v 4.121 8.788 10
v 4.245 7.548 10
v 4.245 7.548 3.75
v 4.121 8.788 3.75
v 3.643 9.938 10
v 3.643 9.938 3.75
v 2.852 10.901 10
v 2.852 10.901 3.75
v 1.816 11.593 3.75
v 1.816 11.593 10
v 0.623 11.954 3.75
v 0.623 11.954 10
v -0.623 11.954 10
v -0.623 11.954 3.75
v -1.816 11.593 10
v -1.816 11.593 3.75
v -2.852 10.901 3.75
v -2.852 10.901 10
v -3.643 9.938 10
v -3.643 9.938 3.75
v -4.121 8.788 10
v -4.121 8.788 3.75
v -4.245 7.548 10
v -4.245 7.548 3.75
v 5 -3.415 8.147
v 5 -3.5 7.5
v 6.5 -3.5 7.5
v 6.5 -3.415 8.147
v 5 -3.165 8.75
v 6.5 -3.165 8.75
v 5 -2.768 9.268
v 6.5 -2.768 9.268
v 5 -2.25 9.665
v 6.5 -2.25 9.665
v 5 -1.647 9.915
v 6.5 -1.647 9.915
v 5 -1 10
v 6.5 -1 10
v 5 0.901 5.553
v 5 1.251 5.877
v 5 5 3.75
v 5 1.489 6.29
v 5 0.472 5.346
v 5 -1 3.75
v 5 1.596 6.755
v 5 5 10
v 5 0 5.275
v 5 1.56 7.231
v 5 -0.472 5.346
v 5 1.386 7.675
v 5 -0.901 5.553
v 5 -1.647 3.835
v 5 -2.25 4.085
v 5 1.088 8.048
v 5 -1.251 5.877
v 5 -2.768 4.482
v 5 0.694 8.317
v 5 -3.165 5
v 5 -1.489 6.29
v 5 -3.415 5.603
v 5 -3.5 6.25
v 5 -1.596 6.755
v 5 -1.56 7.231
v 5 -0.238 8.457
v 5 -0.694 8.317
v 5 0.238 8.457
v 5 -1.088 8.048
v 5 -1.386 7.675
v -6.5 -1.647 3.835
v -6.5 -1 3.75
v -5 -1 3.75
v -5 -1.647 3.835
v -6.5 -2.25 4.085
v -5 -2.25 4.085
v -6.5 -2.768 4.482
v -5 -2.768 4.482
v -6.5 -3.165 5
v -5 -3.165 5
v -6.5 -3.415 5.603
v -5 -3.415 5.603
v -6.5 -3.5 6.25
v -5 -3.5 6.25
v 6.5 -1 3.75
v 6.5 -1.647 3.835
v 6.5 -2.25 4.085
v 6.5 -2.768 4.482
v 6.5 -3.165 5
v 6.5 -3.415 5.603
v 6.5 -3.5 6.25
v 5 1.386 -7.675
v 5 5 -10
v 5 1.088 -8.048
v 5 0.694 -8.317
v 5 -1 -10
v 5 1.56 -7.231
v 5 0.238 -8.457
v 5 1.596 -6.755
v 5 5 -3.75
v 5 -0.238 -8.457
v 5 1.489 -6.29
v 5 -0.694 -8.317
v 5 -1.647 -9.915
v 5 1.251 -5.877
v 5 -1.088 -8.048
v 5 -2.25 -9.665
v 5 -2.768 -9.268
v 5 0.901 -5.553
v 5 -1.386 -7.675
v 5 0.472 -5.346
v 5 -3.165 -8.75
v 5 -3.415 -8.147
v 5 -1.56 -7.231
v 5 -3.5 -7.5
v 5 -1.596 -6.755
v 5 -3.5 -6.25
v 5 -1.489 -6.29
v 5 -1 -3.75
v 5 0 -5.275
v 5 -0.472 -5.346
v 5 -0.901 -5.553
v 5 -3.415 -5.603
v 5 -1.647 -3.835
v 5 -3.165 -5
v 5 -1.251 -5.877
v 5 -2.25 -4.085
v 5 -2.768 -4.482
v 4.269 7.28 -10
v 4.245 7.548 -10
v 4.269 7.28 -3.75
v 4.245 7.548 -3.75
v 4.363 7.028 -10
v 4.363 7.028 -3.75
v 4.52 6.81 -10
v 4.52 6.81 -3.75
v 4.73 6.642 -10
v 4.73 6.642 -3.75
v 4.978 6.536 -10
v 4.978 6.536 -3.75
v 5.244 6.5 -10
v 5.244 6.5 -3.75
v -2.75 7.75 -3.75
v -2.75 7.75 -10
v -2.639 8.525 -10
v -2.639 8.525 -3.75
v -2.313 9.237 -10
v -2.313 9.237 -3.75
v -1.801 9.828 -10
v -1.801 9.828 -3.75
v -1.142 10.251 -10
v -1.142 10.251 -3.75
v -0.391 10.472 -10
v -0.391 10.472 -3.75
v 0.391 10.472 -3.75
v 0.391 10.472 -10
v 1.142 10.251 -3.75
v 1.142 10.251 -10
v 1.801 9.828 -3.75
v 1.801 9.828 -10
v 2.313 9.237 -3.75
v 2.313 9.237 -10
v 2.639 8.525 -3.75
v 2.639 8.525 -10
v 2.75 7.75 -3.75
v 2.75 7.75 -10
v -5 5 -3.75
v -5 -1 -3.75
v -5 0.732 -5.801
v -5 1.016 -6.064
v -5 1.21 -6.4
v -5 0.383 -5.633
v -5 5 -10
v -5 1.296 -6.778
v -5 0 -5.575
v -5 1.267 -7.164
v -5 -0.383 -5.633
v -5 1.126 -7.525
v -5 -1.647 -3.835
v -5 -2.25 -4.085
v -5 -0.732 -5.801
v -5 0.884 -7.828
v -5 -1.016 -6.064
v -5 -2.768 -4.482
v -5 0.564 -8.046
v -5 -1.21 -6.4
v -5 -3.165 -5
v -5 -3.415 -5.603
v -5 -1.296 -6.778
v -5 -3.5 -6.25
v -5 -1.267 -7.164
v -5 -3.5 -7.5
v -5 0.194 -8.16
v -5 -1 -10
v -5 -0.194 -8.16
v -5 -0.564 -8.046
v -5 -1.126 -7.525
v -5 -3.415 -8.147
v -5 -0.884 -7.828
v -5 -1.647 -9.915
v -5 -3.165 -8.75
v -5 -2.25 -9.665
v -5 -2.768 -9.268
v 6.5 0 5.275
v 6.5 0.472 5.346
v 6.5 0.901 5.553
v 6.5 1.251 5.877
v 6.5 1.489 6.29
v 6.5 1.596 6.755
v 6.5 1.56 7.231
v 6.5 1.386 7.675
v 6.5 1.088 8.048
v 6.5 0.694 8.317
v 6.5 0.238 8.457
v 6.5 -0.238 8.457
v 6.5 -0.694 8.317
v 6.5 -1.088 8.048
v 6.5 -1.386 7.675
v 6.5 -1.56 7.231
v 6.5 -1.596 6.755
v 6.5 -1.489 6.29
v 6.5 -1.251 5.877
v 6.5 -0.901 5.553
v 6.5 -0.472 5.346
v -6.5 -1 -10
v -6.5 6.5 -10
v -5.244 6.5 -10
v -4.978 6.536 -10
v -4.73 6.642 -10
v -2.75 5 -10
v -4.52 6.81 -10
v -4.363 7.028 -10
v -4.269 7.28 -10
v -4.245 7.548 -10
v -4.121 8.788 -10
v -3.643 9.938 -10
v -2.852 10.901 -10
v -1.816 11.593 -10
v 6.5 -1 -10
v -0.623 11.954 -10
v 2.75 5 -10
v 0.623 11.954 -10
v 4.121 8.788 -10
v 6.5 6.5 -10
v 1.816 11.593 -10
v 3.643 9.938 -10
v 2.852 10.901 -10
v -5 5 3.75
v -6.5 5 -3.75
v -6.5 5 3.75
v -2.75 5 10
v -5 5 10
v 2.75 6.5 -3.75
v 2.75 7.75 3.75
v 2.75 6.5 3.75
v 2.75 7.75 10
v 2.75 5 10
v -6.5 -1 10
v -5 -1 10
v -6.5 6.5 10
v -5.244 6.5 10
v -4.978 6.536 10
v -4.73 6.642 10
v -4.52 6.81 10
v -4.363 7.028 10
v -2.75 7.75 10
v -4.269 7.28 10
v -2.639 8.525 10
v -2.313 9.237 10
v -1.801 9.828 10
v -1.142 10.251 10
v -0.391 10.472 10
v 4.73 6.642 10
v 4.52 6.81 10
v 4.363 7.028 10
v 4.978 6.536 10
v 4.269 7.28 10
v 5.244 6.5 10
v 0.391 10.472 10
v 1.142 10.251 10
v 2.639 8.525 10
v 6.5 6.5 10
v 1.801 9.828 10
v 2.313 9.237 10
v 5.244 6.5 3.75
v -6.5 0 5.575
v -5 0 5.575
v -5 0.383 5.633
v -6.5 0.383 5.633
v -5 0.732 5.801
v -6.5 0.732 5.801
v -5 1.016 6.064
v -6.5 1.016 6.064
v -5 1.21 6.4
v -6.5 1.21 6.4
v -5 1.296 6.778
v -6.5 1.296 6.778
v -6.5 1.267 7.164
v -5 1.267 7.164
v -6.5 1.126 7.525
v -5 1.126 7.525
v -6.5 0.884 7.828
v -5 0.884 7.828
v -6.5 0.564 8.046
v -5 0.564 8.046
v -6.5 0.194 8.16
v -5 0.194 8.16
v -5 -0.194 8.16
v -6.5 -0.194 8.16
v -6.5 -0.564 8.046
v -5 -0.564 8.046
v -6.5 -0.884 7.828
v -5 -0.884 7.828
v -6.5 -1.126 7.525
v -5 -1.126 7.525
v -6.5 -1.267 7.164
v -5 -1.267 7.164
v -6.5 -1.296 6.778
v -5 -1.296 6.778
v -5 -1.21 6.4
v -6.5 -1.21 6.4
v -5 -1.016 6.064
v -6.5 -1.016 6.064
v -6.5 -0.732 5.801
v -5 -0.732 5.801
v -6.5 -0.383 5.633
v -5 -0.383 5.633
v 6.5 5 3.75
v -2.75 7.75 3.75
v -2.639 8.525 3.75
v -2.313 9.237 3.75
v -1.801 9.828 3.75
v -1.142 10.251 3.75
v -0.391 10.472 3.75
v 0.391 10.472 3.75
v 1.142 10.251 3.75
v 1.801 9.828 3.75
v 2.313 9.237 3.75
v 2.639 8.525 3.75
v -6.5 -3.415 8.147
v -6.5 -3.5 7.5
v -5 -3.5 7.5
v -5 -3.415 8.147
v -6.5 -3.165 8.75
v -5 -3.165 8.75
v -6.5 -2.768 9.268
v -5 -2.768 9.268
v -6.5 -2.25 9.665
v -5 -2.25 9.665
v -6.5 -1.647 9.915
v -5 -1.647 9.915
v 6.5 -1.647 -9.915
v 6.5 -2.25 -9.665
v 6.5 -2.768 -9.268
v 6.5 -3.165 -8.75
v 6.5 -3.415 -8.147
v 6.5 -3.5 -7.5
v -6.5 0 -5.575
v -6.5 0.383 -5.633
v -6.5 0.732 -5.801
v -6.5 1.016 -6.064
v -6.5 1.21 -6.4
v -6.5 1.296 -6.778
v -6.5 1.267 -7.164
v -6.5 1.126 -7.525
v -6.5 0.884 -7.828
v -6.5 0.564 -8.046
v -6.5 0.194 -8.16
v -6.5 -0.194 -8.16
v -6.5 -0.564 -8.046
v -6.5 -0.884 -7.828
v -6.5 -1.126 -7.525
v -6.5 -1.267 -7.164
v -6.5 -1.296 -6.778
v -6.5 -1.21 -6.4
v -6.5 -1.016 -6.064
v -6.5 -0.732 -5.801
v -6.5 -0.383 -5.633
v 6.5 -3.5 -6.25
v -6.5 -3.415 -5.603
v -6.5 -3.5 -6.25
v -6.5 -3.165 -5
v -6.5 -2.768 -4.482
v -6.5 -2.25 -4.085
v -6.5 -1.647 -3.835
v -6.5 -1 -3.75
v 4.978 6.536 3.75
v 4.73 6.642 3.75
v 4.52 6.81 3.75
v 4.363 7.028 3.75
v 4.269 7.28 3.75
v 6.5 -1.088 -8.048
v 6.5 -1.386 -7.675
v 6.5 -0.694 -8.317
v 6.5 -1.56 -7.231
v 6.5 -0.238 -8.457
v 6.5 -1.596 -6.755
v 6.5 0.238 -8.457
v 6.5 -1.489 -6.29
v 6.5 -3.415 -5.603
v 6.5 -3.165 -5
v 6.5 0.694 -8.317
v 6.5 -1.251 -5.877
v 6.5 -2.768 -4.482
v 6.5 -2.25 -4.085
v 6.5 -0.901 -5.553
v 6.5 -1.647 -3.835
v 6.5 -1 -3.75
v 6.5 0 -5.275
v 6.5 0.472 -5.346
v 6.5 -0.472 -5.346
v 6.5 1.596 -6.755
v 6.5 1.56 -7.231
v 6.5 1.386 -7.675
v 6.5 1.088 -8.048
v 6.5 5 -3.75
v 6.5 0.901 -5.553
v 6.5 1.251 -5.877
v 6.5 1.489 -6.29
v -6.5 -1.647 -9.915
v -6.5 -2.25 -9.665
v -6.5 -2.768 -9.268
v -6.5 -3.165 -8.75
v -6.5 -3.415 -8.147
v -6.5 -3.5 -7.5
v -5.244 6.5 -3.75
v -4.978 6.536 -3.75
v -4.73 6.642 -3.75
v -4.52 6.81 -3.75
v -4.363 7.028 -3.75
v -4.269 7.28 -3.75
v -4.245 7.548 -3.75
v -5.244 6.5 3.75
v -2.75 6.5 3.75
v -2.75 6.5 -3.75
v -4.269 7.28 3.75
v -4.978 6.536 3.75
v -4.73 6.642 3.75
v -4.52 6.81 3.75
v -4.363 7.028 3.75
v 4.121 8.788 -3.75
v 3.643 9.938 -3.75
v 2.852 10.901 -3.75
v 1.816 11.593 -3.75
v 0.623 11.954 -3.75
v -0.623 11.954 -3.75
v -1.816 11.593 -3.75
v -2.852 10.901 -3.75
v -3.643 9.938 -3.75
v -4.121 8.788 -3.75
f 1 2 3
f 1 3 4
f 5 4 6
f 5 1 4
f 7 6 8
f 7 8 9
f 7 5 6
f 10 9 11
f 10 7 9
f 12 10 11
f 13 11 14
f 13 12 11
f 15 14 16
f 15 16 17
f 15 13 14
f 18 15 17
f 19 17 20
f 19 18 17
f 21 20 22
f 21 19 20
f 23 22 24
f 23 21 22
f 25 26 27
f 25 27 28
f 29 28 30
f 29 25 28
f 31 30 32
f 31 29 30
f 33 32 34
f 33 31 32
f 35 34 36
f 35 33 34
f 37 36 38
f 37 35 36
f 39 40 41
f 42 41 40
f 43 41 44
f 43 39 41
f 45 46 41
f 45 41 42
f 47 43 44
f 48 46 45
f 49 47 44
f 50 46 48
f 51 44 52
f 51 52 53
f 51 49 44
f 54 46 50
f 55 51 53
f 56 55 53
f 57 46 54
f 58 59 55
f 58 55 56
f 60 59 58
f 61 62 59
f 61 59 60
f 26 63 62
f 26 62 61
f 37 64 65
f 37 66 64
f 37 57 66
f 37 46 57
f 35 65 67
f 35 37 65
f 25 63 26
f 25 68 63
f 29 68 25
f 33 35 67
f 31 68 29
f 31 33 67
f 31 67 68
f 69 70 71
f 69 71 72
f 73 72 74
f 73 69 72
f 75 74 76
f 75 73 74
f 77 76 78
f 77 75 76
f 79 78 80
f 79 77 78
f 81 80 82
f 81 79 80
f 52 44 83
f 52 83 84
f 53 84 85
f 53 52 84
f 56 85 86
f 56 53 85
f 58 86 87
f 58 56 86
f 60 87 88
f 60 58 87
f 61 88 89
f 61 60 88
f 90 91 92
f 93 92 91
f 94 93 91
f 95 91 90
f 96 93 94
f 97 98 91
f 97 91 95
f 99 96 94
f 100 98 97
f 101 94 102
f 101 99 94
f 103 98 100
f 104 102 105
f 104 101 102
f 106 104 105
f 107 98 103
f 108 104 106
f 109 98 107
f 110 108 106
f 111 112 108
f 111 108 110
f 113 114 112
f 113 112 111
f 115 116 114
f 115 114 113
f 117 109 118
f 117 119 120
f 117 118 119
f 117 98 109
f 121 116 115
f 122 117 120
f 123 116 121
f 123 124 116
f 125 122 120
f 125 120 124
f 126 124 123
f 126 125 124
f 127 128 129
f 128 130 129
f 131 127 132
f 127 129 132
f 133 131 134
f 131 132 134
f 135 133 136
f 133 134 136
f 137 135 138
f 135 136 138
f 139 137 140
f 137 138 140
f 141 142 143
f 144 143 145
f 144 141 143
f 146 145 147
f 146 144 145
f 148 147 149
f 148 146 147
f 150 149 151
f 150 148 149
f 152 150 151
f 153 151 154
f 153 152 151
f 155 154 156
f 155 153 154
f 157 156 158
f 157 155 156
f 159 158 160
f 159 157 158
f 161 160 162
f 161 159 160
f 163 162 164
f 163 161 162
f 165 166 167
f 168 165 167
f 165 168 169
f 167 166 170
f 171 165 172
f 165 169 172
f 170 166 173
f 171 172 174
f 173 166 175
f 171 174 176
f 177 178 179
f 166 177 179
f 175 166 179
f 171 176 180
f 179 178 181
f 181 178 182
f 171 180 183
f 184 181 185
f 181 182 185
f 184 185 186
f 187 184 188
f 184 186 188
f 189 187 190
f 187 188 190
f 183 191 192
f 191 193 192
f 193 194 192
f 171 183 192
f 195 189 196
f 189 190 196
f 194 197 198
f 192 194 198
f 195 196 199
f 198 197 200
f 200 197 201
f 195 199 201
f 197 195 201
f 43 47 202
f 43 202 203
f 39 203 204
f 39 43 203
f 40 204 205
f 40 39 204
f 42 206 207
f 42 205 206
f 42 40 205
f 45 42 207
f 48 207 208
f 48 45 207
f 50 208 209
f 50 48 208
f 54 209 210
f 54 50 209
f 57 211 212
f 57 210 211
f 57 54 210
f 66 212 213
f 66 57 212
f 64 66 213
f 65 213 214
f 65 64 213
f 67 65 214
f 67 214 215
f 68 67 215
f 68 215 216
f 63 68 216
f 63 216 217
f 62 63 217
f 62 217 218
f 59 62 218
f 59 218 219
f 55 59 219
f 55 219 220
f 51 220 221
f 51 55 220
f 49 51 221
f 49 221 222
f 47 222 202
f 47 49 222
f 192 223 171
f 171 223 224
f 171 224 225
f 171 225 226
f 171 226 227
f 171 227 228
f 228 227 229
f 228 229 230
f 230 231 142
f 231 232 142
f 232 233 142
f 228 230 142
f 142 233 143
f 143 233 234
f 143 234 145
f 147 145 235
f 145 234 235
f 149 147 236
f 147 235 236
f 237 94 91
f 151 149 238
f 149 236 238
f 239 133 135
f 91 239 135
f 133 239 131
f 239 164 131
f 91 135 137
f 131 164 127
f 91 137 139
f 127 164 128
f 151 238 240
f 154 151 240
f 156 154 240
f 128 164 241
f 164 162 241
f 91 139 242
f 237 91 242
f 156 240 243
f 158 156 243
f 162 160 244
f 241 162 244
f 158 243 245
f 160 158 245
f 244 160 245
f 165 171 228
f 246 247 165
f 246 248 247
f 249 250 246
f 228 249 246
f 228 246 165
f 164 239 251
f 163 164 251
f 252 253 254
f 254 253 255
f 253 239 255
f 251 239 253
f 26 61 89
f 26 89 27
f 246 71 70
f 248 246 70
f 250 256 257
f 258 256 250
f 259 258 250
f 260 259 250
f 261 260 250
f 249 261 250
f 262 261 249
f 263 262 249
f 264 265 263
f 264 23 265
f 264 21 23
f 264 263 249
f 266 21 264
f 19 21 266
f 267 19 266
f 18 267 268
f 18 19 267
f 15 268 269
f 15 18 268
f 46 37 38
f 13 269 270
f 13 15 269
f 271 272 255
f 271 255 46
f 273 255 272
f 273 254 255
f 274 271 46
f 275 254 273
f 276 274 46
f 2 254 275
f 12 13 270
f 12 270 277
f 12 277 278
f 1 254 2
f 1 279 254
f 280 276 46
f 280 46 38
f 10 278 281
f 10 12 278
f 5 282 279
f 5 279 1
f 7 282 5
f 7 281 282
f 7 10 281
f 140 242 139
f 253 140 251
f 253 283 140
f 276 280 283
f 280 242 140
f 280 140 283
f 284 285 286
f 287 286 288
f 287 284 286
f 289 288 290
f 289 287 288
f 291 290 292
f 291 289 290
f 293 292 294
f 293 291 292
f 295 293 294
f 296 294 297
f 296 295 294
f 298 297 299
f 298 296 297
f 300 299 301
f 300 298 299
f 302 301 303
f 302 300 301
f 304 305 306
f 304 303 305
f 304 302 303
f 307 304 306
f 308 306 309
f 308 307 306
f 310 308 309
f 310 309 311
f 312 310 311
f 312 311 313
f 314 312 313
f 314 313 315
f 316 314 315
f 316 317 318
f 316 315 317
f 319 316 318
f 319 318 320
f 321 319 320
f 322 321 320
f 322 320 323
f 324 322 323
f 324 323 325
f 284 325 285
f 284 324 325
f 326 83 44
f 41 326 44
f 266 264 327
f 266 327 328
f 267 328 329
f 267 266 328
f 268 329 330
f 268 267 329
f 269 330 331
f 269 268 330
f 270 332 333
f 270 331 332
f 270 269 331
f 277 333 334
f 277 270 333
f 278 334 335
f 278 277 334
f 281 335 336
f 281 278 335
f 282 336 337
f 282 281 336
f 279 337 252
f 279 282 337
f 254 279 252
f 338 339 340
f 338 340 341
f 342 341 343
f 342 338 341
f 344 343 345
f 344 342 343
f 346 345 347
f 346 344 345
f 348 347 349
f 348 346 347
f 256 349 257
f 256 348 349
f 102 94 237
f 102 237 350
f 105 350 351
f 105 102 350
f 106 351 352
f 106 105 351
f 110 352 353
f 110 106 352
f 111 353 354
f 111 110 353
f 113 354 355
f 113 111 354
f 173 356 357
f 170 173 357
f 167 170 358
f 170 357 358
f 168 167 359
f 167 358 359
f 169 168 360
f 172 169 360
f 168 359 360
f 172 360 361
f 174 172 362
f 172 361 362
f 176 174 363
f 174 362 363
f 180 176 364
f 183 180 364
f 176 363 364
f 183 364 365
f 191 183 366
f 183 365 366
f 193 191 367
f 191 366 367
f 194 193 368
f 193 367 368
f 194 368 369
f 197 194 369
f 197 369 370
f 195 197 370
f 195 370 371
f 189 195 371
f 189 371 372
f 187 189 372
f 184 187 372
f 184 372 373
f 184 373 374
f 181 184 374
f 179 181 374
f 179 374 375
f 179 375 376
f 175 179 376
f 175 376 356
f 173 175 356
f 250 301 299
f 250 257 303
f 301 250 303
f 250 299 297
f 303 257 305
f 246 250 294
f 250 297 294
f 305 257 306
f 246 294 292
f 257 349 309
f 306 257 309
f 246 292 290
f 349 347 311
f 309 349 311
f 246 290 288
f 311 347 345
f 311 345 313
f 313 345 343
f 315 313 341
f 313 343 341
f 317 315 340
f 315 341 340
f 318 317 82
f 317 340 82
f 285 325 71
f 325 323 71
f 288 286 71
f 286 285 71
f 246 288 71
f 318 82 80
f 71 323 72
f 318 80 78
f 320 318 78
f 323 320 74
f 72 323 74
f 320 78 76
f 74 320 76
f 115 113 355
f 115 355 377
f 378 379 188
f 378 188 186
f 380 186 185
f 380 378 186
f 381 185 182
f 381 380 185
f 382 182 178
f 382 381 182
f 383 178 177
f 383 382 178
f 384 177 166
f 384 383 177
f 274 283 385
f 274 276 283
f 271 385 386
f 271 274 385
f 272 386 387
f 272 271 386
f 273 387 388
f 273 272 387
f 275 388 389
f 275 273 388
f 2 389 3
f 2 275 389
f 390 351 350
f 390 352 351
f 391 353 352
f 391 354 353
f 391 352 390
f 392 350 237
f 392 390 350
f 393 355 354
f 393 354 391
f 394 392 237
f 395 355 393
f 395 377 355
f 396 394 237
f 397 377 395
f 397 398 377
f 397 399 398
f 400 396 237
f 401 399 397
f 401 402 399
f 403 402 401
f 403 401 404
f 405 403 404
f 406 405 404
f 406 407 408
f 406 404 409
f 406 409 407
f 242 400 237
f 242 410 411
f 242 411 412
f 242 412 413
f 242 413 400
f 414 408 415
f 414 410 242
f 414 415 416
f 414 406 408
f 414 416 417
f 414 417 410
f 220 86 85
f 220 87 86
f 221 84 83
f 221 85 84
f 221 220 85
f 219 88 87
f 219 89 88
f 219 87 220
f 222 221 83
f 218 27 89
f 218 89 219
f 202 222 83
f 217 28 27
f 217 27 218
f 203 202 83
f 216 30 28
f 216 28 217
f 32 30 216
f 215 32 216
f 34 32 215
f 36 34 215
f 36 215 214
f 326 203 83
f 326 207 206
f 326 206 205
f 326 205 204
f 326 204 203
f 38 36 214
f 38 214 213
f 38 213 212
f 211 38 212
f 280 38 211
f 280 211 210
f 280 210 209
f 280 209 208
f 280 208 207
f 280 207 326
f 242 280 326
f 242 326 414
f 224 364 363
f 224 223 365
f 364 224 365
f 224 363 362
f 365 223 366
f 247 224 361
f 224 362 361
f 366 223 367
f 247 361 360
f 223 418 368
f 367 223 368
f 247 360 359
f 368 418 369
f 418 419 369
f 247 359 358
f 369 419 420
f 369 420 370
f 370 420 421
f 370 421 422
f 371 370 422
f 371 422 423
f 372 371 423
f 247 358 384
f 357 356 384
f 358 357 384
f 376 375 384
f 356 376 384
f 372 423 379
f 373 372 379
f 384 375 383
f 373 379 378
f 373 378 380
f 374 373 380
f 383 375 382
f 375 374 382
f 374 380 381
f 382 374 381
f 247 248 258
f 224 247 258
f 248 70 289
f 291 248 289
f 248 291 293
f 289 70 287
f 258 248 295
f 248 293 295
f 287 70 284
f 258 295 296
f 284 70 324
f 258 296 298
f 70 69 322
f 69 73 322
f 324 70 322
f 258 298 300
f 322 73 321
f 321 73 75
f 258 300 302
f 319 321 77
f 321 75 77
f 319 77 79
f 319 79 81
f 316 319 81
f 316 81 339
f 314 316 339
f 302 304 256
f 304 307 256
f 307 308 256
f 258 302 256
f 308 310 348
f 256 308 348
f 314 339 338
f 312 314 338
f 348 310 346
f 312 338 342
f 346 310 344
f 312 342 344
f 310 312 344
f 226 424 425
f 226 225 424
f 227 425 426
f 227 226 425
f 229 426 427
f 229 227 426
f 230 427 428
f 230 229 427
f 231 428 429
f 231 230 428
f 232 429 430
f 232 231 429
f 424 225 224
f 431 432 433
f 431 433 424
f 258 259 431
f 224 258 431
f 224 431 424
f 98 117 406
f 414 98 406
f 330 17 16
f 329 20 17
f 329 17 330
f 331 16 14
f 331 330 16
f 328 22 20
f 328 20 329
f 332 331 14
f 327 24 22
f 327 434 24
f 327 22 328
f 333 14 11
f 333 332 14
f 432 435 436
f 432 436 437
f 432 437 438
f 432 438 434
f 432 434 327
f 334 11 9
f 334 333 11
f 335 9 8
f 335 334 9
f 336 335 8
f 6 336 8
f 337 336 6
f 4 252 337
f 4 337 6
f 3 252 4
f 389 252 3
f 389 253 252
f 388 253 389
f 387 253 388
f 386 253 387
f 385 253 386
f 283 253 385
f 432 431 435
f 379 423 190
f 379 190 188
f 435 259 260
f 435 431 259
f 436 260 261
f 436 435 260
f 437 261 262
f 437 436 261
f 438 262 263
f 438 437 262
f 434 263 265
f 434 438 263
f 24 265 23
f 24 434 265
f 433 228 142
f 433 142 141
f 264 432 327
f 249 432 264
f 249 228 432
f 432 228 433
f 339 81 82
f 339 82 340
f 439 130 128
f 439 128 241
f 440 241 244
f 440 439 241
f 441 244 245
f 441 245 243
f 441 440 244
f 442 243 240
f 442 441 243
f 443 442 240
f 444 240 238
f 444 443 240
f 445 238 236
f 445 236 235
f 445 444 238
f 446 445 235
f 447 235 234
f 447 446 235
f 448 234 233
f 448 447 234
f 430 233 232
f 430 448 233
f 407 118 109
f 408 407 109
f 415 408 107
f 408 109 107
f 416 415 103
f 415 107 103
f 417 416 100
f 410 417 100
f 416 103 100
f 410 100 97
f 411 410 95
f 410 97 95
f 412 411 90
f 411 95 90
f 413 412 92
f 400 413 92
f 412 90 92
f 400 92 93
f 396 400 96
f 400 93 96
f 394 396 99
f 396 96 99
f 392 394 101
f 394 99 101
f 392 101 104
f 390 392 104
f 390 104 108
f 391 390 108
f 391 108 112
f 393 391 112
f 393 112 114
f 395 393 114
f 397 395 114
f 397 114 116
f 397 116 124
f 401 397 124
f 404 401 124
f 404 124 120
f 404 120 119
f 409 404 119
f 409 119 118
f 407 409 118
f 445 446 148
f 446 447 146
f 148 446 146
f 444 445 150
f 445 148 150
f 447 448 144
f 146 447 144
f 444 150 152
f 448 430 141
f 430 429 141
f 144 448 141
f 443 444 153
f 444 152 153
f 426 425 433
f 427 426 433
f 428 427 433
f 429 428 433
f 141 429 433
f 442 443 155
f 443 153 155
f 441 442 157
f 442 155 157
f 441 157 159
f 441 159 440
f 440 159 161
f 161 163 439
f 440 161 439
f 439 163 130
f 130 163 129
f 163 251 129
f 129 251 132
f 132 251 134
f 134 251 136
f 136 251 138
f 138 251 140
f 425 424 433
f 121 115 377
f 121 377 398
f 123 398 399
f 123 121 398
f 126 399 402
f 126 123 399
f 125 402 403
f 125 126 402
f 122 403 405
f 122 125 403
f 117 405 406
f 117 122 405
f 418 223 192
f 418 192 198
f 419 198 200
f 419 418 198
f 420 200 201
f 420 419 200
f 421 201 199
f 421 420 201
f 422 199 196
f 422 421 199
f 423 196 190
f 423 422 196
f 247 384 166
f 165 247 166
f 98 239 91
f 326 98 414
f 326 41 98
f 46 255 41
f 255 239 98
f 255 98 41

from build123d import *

# Parameters (mm, degrees)
EXTRUDE_1_DEPTH     = 10
SKETCH_2_W          = 10
SKETCH_2_H          = 7.5
SKETCH_2_W_2        = 1.5
CUT_EXTRUDE_1_DEPTH = 10
CUT_EXTRUDE_START   = -1.5
SKETCH_3_W          = 13
SKETCH_3_H          = 7.5
CUT_EXTRUDE_2_DEPTH = 20
CUT_EXTRUDE_3_REACH = 17.564
SKETCH_4_W          = 5.5
SKETCH_4_H          = 20
FILLET_1_R          = 2.5
FILLET_2_R          = 1
SKETCH_5_R          = 1.6
CUT_EXTRUDE_4_DEPTH = 20
MOVE_START          = -6.5
MOVE_FACE_1_DEPTH   = 13
MOVE_FACE_2_BY      = 0.3
MOVE_FACE_2_2_BY    = 0.3


# Read off the part's stored shape, not the designer's step: 面の移動1
with BuildPart() as part:
    # ｽｹｯﾁ1 → ﾎﾞｽ - 押し出し1 (new, symmetric)
    with BuildSketch(Plane.XY):
        with BuildLine():
            Line((-5, 5), (5, 5))
            Line((5, 5), (5, -5))
            Line((5, -5), (6.5, -5))
            Line((6.5, -5), (6.5, 6.5))
            Line((6.5, 6.5), (4.062019202, 6.5))
            ThreePointArc((4.062019202, 6.5), (0, 12), (-4.062019202, 6.5))
            Line((-4.062019202, 6.5), (-6.5, 6.5))
            Line((-6.5, 6.5), (-6.5, -5))
            Line((-6.5, -5), (-5, -5))
            Line((-5, -5), (-5, 5))
        make_face()
        with BuildLine():
            Line((2.449489743, 6.5), (-2.449489743, 6.5))
            ThreePointArc((-2.449489743, 6.5), (0, 10.5), (2.449489743, 6.5))
        make_face(mode=Mode.SUBTRACT)
    extrude(amount=EXTRUDE_1_DEPTH, both=True)

    # ｽｹｯﾁ2 → ｶｯﾄ - 押し出し1 (cut)
    with BuildSketch(Plane.XZ.offset(5)):
        Rectangle(SKETCH_2_W, SKETCH_2_H)
        with Locations((-5.75, 0)):
            Rectangle(SKETCH_2_W_2, SKETCH_2_H)
        with Locations((5.75, 0)):
            Rectangle(SKETCH_2_W_2, SKETCH_2_H)
    extrude(amount=-CUT_EXTRUDE_1_DEPTH, mode=Mode.SUBTRACT)

    # ｽｹｯﾁ3 → ｶｯﾄ - 押し出し2 (cut)
    with BuildSketch(Plane.XZ.offset(-5).offset(CUT_EXTRUDE_START)):
        Rectangle(SKETCH_3_W, SKETCH_3_H)
    extrude(amount=-CUT_EXTRUDE_2_DEPTH, mode=Mode.SUBTRACT)

    # ｽｹｯﾁ4 → ｶｯﾄ - 押し出し3 (cut, up to next)
    with BuildSketch(Plane.XZ.offset(-5), mode=Mode.PRIVATE) as cut_extrude_3_sk1:
        Rectangle(SKETCH_4_W, SKETCH_4_H)
    cut_extrude_3_tool1 = extrude(cut_extrude_3_sk1.sketch, amount=-CUT_EXTRUDE_3_REACH, mode=Mode.PRIVATE) & part.part
    add(cut_extrude_3_tool1.solids().sort_by_distance((0, 5, 0))[0], mode=Mode.SUBTRACT)

    # ﾌｨﾚｯﾄ1
    fillet_1_edges = [part.edges().sort_by_distance(p)[0] for p in [
        (5.75, -5, -10),
        (-5.75, -5, -10),
        (-5.75, -5, 10),
        (-5.75, -5, -3.75),
        (-5.75, -5, 3.75),
        (5.75, -5, -3.75),
        (5.75, -5, 3.75),
        (5.75, -5, 10),
    ]]
    fillet(fillet_1_edges, radius=FILLET_1_R)

    # ﾌｨﾚｯﾄ2
    fillet_2_edges = [part.edges().sort_by_distance(p)[0] for p in [
        (-4.062019202, 6.5, 6.875),
        (4.062019202, 6.5, 6.875),
        (-4.062019202, 6.5, -6.875),
        (4.062019202, 6.5, -6.875),
    ]]
    fillet(fillet_2_edges, radius=FILLET_2_R)

    # ｽｹｯﾁ5 → ｶｯﾄ - 押し出し4 (cut)
    with BuildSketch(Plane.ZY.offset(6.5)):
        with Locations((-6.875, 0)):
            Circle(SKETCH_5_R)
    cut_extrude_4 = extrude(amount=-CUT_EXTRUDE_4_DEPTH, mode=Mode.SUBTRACT)

    # ﾐﾗｰ1: ｶｯﾄ - 押し出し4 across plane
    add(cut_extrude_4.mirror(Plane.XY), mode=Mode.SUBTRACT)

    # Move Face 1 outline → Move Face 1 (cut)
    with BuildSketch(Plane.YZ.offset(MOVE_START)):
        with BuildLine():
            ThreePointArc((-1, 3.75), (-2.767766953, 4.482233047), (-3.5, 6.25))
            Line((-3.5, 6.25), (-3.5, 7.5))
            ThreePointArc((-3.5, 7.5), (-2.767766953, 9.267766953), (-1, 10))
            Line((-1, 10), (-2.5, 10))
            ThreePointArc((-2.5, 10), (-4.267766953, 9.267766953), (-5, 7.5))
            Line((-5, 7.5), (-5, 6.25))
            ThreePointArc((-5, 6.25), (-4.267766953, 4.482233047), (-2.5, 3.75))
            Line((-2.5, 3.75), (-1, 3.75))
        make_face()
        with BuildLine():
            ThreePointArc((-1, -10), (-2.767766953, -9.267766953), (-3.5, -7.5))
            Line((-3.5, -7.5), (-3.5, -6.25))
            ThreePointArc((-3.5, -6.25), (-2.767766953, -4.482233047), (-1, -3.75))
            Line((-1, -3.75), (-2.5, -3.75))
            ThreePointArc((-2.5, -3.75), (-4.267766953, -4.482233047), (-5, -6.25))
            Line((-5, -6.25), (-5, -7.5))
            ThreePointArc((-5, -7.5), (-4.267766953, -9.267766953), (-2.5, -10))
            Line((-2.5, -10), (-1, -10))
        make_face()
    extrude(amount=MOVE_FACE_1_DEPTH, mode=Mode.SUBTRACT)

    # Move Face 2: a curved face moved outward by 0.3
    add(Solid.thicken(part.faces().sort_by_distance((-5.75, 0, -8.475))[0], MOVE_FACE_2_BY))

    # Move Face 2 2: a curved face moved outward by 0.3
    add(Solid.thicken(part.faces().sort_by_distance((-5.75, 0, 8.475))[0], MOVE_FACE_2_2_BY))


solid = part.part
